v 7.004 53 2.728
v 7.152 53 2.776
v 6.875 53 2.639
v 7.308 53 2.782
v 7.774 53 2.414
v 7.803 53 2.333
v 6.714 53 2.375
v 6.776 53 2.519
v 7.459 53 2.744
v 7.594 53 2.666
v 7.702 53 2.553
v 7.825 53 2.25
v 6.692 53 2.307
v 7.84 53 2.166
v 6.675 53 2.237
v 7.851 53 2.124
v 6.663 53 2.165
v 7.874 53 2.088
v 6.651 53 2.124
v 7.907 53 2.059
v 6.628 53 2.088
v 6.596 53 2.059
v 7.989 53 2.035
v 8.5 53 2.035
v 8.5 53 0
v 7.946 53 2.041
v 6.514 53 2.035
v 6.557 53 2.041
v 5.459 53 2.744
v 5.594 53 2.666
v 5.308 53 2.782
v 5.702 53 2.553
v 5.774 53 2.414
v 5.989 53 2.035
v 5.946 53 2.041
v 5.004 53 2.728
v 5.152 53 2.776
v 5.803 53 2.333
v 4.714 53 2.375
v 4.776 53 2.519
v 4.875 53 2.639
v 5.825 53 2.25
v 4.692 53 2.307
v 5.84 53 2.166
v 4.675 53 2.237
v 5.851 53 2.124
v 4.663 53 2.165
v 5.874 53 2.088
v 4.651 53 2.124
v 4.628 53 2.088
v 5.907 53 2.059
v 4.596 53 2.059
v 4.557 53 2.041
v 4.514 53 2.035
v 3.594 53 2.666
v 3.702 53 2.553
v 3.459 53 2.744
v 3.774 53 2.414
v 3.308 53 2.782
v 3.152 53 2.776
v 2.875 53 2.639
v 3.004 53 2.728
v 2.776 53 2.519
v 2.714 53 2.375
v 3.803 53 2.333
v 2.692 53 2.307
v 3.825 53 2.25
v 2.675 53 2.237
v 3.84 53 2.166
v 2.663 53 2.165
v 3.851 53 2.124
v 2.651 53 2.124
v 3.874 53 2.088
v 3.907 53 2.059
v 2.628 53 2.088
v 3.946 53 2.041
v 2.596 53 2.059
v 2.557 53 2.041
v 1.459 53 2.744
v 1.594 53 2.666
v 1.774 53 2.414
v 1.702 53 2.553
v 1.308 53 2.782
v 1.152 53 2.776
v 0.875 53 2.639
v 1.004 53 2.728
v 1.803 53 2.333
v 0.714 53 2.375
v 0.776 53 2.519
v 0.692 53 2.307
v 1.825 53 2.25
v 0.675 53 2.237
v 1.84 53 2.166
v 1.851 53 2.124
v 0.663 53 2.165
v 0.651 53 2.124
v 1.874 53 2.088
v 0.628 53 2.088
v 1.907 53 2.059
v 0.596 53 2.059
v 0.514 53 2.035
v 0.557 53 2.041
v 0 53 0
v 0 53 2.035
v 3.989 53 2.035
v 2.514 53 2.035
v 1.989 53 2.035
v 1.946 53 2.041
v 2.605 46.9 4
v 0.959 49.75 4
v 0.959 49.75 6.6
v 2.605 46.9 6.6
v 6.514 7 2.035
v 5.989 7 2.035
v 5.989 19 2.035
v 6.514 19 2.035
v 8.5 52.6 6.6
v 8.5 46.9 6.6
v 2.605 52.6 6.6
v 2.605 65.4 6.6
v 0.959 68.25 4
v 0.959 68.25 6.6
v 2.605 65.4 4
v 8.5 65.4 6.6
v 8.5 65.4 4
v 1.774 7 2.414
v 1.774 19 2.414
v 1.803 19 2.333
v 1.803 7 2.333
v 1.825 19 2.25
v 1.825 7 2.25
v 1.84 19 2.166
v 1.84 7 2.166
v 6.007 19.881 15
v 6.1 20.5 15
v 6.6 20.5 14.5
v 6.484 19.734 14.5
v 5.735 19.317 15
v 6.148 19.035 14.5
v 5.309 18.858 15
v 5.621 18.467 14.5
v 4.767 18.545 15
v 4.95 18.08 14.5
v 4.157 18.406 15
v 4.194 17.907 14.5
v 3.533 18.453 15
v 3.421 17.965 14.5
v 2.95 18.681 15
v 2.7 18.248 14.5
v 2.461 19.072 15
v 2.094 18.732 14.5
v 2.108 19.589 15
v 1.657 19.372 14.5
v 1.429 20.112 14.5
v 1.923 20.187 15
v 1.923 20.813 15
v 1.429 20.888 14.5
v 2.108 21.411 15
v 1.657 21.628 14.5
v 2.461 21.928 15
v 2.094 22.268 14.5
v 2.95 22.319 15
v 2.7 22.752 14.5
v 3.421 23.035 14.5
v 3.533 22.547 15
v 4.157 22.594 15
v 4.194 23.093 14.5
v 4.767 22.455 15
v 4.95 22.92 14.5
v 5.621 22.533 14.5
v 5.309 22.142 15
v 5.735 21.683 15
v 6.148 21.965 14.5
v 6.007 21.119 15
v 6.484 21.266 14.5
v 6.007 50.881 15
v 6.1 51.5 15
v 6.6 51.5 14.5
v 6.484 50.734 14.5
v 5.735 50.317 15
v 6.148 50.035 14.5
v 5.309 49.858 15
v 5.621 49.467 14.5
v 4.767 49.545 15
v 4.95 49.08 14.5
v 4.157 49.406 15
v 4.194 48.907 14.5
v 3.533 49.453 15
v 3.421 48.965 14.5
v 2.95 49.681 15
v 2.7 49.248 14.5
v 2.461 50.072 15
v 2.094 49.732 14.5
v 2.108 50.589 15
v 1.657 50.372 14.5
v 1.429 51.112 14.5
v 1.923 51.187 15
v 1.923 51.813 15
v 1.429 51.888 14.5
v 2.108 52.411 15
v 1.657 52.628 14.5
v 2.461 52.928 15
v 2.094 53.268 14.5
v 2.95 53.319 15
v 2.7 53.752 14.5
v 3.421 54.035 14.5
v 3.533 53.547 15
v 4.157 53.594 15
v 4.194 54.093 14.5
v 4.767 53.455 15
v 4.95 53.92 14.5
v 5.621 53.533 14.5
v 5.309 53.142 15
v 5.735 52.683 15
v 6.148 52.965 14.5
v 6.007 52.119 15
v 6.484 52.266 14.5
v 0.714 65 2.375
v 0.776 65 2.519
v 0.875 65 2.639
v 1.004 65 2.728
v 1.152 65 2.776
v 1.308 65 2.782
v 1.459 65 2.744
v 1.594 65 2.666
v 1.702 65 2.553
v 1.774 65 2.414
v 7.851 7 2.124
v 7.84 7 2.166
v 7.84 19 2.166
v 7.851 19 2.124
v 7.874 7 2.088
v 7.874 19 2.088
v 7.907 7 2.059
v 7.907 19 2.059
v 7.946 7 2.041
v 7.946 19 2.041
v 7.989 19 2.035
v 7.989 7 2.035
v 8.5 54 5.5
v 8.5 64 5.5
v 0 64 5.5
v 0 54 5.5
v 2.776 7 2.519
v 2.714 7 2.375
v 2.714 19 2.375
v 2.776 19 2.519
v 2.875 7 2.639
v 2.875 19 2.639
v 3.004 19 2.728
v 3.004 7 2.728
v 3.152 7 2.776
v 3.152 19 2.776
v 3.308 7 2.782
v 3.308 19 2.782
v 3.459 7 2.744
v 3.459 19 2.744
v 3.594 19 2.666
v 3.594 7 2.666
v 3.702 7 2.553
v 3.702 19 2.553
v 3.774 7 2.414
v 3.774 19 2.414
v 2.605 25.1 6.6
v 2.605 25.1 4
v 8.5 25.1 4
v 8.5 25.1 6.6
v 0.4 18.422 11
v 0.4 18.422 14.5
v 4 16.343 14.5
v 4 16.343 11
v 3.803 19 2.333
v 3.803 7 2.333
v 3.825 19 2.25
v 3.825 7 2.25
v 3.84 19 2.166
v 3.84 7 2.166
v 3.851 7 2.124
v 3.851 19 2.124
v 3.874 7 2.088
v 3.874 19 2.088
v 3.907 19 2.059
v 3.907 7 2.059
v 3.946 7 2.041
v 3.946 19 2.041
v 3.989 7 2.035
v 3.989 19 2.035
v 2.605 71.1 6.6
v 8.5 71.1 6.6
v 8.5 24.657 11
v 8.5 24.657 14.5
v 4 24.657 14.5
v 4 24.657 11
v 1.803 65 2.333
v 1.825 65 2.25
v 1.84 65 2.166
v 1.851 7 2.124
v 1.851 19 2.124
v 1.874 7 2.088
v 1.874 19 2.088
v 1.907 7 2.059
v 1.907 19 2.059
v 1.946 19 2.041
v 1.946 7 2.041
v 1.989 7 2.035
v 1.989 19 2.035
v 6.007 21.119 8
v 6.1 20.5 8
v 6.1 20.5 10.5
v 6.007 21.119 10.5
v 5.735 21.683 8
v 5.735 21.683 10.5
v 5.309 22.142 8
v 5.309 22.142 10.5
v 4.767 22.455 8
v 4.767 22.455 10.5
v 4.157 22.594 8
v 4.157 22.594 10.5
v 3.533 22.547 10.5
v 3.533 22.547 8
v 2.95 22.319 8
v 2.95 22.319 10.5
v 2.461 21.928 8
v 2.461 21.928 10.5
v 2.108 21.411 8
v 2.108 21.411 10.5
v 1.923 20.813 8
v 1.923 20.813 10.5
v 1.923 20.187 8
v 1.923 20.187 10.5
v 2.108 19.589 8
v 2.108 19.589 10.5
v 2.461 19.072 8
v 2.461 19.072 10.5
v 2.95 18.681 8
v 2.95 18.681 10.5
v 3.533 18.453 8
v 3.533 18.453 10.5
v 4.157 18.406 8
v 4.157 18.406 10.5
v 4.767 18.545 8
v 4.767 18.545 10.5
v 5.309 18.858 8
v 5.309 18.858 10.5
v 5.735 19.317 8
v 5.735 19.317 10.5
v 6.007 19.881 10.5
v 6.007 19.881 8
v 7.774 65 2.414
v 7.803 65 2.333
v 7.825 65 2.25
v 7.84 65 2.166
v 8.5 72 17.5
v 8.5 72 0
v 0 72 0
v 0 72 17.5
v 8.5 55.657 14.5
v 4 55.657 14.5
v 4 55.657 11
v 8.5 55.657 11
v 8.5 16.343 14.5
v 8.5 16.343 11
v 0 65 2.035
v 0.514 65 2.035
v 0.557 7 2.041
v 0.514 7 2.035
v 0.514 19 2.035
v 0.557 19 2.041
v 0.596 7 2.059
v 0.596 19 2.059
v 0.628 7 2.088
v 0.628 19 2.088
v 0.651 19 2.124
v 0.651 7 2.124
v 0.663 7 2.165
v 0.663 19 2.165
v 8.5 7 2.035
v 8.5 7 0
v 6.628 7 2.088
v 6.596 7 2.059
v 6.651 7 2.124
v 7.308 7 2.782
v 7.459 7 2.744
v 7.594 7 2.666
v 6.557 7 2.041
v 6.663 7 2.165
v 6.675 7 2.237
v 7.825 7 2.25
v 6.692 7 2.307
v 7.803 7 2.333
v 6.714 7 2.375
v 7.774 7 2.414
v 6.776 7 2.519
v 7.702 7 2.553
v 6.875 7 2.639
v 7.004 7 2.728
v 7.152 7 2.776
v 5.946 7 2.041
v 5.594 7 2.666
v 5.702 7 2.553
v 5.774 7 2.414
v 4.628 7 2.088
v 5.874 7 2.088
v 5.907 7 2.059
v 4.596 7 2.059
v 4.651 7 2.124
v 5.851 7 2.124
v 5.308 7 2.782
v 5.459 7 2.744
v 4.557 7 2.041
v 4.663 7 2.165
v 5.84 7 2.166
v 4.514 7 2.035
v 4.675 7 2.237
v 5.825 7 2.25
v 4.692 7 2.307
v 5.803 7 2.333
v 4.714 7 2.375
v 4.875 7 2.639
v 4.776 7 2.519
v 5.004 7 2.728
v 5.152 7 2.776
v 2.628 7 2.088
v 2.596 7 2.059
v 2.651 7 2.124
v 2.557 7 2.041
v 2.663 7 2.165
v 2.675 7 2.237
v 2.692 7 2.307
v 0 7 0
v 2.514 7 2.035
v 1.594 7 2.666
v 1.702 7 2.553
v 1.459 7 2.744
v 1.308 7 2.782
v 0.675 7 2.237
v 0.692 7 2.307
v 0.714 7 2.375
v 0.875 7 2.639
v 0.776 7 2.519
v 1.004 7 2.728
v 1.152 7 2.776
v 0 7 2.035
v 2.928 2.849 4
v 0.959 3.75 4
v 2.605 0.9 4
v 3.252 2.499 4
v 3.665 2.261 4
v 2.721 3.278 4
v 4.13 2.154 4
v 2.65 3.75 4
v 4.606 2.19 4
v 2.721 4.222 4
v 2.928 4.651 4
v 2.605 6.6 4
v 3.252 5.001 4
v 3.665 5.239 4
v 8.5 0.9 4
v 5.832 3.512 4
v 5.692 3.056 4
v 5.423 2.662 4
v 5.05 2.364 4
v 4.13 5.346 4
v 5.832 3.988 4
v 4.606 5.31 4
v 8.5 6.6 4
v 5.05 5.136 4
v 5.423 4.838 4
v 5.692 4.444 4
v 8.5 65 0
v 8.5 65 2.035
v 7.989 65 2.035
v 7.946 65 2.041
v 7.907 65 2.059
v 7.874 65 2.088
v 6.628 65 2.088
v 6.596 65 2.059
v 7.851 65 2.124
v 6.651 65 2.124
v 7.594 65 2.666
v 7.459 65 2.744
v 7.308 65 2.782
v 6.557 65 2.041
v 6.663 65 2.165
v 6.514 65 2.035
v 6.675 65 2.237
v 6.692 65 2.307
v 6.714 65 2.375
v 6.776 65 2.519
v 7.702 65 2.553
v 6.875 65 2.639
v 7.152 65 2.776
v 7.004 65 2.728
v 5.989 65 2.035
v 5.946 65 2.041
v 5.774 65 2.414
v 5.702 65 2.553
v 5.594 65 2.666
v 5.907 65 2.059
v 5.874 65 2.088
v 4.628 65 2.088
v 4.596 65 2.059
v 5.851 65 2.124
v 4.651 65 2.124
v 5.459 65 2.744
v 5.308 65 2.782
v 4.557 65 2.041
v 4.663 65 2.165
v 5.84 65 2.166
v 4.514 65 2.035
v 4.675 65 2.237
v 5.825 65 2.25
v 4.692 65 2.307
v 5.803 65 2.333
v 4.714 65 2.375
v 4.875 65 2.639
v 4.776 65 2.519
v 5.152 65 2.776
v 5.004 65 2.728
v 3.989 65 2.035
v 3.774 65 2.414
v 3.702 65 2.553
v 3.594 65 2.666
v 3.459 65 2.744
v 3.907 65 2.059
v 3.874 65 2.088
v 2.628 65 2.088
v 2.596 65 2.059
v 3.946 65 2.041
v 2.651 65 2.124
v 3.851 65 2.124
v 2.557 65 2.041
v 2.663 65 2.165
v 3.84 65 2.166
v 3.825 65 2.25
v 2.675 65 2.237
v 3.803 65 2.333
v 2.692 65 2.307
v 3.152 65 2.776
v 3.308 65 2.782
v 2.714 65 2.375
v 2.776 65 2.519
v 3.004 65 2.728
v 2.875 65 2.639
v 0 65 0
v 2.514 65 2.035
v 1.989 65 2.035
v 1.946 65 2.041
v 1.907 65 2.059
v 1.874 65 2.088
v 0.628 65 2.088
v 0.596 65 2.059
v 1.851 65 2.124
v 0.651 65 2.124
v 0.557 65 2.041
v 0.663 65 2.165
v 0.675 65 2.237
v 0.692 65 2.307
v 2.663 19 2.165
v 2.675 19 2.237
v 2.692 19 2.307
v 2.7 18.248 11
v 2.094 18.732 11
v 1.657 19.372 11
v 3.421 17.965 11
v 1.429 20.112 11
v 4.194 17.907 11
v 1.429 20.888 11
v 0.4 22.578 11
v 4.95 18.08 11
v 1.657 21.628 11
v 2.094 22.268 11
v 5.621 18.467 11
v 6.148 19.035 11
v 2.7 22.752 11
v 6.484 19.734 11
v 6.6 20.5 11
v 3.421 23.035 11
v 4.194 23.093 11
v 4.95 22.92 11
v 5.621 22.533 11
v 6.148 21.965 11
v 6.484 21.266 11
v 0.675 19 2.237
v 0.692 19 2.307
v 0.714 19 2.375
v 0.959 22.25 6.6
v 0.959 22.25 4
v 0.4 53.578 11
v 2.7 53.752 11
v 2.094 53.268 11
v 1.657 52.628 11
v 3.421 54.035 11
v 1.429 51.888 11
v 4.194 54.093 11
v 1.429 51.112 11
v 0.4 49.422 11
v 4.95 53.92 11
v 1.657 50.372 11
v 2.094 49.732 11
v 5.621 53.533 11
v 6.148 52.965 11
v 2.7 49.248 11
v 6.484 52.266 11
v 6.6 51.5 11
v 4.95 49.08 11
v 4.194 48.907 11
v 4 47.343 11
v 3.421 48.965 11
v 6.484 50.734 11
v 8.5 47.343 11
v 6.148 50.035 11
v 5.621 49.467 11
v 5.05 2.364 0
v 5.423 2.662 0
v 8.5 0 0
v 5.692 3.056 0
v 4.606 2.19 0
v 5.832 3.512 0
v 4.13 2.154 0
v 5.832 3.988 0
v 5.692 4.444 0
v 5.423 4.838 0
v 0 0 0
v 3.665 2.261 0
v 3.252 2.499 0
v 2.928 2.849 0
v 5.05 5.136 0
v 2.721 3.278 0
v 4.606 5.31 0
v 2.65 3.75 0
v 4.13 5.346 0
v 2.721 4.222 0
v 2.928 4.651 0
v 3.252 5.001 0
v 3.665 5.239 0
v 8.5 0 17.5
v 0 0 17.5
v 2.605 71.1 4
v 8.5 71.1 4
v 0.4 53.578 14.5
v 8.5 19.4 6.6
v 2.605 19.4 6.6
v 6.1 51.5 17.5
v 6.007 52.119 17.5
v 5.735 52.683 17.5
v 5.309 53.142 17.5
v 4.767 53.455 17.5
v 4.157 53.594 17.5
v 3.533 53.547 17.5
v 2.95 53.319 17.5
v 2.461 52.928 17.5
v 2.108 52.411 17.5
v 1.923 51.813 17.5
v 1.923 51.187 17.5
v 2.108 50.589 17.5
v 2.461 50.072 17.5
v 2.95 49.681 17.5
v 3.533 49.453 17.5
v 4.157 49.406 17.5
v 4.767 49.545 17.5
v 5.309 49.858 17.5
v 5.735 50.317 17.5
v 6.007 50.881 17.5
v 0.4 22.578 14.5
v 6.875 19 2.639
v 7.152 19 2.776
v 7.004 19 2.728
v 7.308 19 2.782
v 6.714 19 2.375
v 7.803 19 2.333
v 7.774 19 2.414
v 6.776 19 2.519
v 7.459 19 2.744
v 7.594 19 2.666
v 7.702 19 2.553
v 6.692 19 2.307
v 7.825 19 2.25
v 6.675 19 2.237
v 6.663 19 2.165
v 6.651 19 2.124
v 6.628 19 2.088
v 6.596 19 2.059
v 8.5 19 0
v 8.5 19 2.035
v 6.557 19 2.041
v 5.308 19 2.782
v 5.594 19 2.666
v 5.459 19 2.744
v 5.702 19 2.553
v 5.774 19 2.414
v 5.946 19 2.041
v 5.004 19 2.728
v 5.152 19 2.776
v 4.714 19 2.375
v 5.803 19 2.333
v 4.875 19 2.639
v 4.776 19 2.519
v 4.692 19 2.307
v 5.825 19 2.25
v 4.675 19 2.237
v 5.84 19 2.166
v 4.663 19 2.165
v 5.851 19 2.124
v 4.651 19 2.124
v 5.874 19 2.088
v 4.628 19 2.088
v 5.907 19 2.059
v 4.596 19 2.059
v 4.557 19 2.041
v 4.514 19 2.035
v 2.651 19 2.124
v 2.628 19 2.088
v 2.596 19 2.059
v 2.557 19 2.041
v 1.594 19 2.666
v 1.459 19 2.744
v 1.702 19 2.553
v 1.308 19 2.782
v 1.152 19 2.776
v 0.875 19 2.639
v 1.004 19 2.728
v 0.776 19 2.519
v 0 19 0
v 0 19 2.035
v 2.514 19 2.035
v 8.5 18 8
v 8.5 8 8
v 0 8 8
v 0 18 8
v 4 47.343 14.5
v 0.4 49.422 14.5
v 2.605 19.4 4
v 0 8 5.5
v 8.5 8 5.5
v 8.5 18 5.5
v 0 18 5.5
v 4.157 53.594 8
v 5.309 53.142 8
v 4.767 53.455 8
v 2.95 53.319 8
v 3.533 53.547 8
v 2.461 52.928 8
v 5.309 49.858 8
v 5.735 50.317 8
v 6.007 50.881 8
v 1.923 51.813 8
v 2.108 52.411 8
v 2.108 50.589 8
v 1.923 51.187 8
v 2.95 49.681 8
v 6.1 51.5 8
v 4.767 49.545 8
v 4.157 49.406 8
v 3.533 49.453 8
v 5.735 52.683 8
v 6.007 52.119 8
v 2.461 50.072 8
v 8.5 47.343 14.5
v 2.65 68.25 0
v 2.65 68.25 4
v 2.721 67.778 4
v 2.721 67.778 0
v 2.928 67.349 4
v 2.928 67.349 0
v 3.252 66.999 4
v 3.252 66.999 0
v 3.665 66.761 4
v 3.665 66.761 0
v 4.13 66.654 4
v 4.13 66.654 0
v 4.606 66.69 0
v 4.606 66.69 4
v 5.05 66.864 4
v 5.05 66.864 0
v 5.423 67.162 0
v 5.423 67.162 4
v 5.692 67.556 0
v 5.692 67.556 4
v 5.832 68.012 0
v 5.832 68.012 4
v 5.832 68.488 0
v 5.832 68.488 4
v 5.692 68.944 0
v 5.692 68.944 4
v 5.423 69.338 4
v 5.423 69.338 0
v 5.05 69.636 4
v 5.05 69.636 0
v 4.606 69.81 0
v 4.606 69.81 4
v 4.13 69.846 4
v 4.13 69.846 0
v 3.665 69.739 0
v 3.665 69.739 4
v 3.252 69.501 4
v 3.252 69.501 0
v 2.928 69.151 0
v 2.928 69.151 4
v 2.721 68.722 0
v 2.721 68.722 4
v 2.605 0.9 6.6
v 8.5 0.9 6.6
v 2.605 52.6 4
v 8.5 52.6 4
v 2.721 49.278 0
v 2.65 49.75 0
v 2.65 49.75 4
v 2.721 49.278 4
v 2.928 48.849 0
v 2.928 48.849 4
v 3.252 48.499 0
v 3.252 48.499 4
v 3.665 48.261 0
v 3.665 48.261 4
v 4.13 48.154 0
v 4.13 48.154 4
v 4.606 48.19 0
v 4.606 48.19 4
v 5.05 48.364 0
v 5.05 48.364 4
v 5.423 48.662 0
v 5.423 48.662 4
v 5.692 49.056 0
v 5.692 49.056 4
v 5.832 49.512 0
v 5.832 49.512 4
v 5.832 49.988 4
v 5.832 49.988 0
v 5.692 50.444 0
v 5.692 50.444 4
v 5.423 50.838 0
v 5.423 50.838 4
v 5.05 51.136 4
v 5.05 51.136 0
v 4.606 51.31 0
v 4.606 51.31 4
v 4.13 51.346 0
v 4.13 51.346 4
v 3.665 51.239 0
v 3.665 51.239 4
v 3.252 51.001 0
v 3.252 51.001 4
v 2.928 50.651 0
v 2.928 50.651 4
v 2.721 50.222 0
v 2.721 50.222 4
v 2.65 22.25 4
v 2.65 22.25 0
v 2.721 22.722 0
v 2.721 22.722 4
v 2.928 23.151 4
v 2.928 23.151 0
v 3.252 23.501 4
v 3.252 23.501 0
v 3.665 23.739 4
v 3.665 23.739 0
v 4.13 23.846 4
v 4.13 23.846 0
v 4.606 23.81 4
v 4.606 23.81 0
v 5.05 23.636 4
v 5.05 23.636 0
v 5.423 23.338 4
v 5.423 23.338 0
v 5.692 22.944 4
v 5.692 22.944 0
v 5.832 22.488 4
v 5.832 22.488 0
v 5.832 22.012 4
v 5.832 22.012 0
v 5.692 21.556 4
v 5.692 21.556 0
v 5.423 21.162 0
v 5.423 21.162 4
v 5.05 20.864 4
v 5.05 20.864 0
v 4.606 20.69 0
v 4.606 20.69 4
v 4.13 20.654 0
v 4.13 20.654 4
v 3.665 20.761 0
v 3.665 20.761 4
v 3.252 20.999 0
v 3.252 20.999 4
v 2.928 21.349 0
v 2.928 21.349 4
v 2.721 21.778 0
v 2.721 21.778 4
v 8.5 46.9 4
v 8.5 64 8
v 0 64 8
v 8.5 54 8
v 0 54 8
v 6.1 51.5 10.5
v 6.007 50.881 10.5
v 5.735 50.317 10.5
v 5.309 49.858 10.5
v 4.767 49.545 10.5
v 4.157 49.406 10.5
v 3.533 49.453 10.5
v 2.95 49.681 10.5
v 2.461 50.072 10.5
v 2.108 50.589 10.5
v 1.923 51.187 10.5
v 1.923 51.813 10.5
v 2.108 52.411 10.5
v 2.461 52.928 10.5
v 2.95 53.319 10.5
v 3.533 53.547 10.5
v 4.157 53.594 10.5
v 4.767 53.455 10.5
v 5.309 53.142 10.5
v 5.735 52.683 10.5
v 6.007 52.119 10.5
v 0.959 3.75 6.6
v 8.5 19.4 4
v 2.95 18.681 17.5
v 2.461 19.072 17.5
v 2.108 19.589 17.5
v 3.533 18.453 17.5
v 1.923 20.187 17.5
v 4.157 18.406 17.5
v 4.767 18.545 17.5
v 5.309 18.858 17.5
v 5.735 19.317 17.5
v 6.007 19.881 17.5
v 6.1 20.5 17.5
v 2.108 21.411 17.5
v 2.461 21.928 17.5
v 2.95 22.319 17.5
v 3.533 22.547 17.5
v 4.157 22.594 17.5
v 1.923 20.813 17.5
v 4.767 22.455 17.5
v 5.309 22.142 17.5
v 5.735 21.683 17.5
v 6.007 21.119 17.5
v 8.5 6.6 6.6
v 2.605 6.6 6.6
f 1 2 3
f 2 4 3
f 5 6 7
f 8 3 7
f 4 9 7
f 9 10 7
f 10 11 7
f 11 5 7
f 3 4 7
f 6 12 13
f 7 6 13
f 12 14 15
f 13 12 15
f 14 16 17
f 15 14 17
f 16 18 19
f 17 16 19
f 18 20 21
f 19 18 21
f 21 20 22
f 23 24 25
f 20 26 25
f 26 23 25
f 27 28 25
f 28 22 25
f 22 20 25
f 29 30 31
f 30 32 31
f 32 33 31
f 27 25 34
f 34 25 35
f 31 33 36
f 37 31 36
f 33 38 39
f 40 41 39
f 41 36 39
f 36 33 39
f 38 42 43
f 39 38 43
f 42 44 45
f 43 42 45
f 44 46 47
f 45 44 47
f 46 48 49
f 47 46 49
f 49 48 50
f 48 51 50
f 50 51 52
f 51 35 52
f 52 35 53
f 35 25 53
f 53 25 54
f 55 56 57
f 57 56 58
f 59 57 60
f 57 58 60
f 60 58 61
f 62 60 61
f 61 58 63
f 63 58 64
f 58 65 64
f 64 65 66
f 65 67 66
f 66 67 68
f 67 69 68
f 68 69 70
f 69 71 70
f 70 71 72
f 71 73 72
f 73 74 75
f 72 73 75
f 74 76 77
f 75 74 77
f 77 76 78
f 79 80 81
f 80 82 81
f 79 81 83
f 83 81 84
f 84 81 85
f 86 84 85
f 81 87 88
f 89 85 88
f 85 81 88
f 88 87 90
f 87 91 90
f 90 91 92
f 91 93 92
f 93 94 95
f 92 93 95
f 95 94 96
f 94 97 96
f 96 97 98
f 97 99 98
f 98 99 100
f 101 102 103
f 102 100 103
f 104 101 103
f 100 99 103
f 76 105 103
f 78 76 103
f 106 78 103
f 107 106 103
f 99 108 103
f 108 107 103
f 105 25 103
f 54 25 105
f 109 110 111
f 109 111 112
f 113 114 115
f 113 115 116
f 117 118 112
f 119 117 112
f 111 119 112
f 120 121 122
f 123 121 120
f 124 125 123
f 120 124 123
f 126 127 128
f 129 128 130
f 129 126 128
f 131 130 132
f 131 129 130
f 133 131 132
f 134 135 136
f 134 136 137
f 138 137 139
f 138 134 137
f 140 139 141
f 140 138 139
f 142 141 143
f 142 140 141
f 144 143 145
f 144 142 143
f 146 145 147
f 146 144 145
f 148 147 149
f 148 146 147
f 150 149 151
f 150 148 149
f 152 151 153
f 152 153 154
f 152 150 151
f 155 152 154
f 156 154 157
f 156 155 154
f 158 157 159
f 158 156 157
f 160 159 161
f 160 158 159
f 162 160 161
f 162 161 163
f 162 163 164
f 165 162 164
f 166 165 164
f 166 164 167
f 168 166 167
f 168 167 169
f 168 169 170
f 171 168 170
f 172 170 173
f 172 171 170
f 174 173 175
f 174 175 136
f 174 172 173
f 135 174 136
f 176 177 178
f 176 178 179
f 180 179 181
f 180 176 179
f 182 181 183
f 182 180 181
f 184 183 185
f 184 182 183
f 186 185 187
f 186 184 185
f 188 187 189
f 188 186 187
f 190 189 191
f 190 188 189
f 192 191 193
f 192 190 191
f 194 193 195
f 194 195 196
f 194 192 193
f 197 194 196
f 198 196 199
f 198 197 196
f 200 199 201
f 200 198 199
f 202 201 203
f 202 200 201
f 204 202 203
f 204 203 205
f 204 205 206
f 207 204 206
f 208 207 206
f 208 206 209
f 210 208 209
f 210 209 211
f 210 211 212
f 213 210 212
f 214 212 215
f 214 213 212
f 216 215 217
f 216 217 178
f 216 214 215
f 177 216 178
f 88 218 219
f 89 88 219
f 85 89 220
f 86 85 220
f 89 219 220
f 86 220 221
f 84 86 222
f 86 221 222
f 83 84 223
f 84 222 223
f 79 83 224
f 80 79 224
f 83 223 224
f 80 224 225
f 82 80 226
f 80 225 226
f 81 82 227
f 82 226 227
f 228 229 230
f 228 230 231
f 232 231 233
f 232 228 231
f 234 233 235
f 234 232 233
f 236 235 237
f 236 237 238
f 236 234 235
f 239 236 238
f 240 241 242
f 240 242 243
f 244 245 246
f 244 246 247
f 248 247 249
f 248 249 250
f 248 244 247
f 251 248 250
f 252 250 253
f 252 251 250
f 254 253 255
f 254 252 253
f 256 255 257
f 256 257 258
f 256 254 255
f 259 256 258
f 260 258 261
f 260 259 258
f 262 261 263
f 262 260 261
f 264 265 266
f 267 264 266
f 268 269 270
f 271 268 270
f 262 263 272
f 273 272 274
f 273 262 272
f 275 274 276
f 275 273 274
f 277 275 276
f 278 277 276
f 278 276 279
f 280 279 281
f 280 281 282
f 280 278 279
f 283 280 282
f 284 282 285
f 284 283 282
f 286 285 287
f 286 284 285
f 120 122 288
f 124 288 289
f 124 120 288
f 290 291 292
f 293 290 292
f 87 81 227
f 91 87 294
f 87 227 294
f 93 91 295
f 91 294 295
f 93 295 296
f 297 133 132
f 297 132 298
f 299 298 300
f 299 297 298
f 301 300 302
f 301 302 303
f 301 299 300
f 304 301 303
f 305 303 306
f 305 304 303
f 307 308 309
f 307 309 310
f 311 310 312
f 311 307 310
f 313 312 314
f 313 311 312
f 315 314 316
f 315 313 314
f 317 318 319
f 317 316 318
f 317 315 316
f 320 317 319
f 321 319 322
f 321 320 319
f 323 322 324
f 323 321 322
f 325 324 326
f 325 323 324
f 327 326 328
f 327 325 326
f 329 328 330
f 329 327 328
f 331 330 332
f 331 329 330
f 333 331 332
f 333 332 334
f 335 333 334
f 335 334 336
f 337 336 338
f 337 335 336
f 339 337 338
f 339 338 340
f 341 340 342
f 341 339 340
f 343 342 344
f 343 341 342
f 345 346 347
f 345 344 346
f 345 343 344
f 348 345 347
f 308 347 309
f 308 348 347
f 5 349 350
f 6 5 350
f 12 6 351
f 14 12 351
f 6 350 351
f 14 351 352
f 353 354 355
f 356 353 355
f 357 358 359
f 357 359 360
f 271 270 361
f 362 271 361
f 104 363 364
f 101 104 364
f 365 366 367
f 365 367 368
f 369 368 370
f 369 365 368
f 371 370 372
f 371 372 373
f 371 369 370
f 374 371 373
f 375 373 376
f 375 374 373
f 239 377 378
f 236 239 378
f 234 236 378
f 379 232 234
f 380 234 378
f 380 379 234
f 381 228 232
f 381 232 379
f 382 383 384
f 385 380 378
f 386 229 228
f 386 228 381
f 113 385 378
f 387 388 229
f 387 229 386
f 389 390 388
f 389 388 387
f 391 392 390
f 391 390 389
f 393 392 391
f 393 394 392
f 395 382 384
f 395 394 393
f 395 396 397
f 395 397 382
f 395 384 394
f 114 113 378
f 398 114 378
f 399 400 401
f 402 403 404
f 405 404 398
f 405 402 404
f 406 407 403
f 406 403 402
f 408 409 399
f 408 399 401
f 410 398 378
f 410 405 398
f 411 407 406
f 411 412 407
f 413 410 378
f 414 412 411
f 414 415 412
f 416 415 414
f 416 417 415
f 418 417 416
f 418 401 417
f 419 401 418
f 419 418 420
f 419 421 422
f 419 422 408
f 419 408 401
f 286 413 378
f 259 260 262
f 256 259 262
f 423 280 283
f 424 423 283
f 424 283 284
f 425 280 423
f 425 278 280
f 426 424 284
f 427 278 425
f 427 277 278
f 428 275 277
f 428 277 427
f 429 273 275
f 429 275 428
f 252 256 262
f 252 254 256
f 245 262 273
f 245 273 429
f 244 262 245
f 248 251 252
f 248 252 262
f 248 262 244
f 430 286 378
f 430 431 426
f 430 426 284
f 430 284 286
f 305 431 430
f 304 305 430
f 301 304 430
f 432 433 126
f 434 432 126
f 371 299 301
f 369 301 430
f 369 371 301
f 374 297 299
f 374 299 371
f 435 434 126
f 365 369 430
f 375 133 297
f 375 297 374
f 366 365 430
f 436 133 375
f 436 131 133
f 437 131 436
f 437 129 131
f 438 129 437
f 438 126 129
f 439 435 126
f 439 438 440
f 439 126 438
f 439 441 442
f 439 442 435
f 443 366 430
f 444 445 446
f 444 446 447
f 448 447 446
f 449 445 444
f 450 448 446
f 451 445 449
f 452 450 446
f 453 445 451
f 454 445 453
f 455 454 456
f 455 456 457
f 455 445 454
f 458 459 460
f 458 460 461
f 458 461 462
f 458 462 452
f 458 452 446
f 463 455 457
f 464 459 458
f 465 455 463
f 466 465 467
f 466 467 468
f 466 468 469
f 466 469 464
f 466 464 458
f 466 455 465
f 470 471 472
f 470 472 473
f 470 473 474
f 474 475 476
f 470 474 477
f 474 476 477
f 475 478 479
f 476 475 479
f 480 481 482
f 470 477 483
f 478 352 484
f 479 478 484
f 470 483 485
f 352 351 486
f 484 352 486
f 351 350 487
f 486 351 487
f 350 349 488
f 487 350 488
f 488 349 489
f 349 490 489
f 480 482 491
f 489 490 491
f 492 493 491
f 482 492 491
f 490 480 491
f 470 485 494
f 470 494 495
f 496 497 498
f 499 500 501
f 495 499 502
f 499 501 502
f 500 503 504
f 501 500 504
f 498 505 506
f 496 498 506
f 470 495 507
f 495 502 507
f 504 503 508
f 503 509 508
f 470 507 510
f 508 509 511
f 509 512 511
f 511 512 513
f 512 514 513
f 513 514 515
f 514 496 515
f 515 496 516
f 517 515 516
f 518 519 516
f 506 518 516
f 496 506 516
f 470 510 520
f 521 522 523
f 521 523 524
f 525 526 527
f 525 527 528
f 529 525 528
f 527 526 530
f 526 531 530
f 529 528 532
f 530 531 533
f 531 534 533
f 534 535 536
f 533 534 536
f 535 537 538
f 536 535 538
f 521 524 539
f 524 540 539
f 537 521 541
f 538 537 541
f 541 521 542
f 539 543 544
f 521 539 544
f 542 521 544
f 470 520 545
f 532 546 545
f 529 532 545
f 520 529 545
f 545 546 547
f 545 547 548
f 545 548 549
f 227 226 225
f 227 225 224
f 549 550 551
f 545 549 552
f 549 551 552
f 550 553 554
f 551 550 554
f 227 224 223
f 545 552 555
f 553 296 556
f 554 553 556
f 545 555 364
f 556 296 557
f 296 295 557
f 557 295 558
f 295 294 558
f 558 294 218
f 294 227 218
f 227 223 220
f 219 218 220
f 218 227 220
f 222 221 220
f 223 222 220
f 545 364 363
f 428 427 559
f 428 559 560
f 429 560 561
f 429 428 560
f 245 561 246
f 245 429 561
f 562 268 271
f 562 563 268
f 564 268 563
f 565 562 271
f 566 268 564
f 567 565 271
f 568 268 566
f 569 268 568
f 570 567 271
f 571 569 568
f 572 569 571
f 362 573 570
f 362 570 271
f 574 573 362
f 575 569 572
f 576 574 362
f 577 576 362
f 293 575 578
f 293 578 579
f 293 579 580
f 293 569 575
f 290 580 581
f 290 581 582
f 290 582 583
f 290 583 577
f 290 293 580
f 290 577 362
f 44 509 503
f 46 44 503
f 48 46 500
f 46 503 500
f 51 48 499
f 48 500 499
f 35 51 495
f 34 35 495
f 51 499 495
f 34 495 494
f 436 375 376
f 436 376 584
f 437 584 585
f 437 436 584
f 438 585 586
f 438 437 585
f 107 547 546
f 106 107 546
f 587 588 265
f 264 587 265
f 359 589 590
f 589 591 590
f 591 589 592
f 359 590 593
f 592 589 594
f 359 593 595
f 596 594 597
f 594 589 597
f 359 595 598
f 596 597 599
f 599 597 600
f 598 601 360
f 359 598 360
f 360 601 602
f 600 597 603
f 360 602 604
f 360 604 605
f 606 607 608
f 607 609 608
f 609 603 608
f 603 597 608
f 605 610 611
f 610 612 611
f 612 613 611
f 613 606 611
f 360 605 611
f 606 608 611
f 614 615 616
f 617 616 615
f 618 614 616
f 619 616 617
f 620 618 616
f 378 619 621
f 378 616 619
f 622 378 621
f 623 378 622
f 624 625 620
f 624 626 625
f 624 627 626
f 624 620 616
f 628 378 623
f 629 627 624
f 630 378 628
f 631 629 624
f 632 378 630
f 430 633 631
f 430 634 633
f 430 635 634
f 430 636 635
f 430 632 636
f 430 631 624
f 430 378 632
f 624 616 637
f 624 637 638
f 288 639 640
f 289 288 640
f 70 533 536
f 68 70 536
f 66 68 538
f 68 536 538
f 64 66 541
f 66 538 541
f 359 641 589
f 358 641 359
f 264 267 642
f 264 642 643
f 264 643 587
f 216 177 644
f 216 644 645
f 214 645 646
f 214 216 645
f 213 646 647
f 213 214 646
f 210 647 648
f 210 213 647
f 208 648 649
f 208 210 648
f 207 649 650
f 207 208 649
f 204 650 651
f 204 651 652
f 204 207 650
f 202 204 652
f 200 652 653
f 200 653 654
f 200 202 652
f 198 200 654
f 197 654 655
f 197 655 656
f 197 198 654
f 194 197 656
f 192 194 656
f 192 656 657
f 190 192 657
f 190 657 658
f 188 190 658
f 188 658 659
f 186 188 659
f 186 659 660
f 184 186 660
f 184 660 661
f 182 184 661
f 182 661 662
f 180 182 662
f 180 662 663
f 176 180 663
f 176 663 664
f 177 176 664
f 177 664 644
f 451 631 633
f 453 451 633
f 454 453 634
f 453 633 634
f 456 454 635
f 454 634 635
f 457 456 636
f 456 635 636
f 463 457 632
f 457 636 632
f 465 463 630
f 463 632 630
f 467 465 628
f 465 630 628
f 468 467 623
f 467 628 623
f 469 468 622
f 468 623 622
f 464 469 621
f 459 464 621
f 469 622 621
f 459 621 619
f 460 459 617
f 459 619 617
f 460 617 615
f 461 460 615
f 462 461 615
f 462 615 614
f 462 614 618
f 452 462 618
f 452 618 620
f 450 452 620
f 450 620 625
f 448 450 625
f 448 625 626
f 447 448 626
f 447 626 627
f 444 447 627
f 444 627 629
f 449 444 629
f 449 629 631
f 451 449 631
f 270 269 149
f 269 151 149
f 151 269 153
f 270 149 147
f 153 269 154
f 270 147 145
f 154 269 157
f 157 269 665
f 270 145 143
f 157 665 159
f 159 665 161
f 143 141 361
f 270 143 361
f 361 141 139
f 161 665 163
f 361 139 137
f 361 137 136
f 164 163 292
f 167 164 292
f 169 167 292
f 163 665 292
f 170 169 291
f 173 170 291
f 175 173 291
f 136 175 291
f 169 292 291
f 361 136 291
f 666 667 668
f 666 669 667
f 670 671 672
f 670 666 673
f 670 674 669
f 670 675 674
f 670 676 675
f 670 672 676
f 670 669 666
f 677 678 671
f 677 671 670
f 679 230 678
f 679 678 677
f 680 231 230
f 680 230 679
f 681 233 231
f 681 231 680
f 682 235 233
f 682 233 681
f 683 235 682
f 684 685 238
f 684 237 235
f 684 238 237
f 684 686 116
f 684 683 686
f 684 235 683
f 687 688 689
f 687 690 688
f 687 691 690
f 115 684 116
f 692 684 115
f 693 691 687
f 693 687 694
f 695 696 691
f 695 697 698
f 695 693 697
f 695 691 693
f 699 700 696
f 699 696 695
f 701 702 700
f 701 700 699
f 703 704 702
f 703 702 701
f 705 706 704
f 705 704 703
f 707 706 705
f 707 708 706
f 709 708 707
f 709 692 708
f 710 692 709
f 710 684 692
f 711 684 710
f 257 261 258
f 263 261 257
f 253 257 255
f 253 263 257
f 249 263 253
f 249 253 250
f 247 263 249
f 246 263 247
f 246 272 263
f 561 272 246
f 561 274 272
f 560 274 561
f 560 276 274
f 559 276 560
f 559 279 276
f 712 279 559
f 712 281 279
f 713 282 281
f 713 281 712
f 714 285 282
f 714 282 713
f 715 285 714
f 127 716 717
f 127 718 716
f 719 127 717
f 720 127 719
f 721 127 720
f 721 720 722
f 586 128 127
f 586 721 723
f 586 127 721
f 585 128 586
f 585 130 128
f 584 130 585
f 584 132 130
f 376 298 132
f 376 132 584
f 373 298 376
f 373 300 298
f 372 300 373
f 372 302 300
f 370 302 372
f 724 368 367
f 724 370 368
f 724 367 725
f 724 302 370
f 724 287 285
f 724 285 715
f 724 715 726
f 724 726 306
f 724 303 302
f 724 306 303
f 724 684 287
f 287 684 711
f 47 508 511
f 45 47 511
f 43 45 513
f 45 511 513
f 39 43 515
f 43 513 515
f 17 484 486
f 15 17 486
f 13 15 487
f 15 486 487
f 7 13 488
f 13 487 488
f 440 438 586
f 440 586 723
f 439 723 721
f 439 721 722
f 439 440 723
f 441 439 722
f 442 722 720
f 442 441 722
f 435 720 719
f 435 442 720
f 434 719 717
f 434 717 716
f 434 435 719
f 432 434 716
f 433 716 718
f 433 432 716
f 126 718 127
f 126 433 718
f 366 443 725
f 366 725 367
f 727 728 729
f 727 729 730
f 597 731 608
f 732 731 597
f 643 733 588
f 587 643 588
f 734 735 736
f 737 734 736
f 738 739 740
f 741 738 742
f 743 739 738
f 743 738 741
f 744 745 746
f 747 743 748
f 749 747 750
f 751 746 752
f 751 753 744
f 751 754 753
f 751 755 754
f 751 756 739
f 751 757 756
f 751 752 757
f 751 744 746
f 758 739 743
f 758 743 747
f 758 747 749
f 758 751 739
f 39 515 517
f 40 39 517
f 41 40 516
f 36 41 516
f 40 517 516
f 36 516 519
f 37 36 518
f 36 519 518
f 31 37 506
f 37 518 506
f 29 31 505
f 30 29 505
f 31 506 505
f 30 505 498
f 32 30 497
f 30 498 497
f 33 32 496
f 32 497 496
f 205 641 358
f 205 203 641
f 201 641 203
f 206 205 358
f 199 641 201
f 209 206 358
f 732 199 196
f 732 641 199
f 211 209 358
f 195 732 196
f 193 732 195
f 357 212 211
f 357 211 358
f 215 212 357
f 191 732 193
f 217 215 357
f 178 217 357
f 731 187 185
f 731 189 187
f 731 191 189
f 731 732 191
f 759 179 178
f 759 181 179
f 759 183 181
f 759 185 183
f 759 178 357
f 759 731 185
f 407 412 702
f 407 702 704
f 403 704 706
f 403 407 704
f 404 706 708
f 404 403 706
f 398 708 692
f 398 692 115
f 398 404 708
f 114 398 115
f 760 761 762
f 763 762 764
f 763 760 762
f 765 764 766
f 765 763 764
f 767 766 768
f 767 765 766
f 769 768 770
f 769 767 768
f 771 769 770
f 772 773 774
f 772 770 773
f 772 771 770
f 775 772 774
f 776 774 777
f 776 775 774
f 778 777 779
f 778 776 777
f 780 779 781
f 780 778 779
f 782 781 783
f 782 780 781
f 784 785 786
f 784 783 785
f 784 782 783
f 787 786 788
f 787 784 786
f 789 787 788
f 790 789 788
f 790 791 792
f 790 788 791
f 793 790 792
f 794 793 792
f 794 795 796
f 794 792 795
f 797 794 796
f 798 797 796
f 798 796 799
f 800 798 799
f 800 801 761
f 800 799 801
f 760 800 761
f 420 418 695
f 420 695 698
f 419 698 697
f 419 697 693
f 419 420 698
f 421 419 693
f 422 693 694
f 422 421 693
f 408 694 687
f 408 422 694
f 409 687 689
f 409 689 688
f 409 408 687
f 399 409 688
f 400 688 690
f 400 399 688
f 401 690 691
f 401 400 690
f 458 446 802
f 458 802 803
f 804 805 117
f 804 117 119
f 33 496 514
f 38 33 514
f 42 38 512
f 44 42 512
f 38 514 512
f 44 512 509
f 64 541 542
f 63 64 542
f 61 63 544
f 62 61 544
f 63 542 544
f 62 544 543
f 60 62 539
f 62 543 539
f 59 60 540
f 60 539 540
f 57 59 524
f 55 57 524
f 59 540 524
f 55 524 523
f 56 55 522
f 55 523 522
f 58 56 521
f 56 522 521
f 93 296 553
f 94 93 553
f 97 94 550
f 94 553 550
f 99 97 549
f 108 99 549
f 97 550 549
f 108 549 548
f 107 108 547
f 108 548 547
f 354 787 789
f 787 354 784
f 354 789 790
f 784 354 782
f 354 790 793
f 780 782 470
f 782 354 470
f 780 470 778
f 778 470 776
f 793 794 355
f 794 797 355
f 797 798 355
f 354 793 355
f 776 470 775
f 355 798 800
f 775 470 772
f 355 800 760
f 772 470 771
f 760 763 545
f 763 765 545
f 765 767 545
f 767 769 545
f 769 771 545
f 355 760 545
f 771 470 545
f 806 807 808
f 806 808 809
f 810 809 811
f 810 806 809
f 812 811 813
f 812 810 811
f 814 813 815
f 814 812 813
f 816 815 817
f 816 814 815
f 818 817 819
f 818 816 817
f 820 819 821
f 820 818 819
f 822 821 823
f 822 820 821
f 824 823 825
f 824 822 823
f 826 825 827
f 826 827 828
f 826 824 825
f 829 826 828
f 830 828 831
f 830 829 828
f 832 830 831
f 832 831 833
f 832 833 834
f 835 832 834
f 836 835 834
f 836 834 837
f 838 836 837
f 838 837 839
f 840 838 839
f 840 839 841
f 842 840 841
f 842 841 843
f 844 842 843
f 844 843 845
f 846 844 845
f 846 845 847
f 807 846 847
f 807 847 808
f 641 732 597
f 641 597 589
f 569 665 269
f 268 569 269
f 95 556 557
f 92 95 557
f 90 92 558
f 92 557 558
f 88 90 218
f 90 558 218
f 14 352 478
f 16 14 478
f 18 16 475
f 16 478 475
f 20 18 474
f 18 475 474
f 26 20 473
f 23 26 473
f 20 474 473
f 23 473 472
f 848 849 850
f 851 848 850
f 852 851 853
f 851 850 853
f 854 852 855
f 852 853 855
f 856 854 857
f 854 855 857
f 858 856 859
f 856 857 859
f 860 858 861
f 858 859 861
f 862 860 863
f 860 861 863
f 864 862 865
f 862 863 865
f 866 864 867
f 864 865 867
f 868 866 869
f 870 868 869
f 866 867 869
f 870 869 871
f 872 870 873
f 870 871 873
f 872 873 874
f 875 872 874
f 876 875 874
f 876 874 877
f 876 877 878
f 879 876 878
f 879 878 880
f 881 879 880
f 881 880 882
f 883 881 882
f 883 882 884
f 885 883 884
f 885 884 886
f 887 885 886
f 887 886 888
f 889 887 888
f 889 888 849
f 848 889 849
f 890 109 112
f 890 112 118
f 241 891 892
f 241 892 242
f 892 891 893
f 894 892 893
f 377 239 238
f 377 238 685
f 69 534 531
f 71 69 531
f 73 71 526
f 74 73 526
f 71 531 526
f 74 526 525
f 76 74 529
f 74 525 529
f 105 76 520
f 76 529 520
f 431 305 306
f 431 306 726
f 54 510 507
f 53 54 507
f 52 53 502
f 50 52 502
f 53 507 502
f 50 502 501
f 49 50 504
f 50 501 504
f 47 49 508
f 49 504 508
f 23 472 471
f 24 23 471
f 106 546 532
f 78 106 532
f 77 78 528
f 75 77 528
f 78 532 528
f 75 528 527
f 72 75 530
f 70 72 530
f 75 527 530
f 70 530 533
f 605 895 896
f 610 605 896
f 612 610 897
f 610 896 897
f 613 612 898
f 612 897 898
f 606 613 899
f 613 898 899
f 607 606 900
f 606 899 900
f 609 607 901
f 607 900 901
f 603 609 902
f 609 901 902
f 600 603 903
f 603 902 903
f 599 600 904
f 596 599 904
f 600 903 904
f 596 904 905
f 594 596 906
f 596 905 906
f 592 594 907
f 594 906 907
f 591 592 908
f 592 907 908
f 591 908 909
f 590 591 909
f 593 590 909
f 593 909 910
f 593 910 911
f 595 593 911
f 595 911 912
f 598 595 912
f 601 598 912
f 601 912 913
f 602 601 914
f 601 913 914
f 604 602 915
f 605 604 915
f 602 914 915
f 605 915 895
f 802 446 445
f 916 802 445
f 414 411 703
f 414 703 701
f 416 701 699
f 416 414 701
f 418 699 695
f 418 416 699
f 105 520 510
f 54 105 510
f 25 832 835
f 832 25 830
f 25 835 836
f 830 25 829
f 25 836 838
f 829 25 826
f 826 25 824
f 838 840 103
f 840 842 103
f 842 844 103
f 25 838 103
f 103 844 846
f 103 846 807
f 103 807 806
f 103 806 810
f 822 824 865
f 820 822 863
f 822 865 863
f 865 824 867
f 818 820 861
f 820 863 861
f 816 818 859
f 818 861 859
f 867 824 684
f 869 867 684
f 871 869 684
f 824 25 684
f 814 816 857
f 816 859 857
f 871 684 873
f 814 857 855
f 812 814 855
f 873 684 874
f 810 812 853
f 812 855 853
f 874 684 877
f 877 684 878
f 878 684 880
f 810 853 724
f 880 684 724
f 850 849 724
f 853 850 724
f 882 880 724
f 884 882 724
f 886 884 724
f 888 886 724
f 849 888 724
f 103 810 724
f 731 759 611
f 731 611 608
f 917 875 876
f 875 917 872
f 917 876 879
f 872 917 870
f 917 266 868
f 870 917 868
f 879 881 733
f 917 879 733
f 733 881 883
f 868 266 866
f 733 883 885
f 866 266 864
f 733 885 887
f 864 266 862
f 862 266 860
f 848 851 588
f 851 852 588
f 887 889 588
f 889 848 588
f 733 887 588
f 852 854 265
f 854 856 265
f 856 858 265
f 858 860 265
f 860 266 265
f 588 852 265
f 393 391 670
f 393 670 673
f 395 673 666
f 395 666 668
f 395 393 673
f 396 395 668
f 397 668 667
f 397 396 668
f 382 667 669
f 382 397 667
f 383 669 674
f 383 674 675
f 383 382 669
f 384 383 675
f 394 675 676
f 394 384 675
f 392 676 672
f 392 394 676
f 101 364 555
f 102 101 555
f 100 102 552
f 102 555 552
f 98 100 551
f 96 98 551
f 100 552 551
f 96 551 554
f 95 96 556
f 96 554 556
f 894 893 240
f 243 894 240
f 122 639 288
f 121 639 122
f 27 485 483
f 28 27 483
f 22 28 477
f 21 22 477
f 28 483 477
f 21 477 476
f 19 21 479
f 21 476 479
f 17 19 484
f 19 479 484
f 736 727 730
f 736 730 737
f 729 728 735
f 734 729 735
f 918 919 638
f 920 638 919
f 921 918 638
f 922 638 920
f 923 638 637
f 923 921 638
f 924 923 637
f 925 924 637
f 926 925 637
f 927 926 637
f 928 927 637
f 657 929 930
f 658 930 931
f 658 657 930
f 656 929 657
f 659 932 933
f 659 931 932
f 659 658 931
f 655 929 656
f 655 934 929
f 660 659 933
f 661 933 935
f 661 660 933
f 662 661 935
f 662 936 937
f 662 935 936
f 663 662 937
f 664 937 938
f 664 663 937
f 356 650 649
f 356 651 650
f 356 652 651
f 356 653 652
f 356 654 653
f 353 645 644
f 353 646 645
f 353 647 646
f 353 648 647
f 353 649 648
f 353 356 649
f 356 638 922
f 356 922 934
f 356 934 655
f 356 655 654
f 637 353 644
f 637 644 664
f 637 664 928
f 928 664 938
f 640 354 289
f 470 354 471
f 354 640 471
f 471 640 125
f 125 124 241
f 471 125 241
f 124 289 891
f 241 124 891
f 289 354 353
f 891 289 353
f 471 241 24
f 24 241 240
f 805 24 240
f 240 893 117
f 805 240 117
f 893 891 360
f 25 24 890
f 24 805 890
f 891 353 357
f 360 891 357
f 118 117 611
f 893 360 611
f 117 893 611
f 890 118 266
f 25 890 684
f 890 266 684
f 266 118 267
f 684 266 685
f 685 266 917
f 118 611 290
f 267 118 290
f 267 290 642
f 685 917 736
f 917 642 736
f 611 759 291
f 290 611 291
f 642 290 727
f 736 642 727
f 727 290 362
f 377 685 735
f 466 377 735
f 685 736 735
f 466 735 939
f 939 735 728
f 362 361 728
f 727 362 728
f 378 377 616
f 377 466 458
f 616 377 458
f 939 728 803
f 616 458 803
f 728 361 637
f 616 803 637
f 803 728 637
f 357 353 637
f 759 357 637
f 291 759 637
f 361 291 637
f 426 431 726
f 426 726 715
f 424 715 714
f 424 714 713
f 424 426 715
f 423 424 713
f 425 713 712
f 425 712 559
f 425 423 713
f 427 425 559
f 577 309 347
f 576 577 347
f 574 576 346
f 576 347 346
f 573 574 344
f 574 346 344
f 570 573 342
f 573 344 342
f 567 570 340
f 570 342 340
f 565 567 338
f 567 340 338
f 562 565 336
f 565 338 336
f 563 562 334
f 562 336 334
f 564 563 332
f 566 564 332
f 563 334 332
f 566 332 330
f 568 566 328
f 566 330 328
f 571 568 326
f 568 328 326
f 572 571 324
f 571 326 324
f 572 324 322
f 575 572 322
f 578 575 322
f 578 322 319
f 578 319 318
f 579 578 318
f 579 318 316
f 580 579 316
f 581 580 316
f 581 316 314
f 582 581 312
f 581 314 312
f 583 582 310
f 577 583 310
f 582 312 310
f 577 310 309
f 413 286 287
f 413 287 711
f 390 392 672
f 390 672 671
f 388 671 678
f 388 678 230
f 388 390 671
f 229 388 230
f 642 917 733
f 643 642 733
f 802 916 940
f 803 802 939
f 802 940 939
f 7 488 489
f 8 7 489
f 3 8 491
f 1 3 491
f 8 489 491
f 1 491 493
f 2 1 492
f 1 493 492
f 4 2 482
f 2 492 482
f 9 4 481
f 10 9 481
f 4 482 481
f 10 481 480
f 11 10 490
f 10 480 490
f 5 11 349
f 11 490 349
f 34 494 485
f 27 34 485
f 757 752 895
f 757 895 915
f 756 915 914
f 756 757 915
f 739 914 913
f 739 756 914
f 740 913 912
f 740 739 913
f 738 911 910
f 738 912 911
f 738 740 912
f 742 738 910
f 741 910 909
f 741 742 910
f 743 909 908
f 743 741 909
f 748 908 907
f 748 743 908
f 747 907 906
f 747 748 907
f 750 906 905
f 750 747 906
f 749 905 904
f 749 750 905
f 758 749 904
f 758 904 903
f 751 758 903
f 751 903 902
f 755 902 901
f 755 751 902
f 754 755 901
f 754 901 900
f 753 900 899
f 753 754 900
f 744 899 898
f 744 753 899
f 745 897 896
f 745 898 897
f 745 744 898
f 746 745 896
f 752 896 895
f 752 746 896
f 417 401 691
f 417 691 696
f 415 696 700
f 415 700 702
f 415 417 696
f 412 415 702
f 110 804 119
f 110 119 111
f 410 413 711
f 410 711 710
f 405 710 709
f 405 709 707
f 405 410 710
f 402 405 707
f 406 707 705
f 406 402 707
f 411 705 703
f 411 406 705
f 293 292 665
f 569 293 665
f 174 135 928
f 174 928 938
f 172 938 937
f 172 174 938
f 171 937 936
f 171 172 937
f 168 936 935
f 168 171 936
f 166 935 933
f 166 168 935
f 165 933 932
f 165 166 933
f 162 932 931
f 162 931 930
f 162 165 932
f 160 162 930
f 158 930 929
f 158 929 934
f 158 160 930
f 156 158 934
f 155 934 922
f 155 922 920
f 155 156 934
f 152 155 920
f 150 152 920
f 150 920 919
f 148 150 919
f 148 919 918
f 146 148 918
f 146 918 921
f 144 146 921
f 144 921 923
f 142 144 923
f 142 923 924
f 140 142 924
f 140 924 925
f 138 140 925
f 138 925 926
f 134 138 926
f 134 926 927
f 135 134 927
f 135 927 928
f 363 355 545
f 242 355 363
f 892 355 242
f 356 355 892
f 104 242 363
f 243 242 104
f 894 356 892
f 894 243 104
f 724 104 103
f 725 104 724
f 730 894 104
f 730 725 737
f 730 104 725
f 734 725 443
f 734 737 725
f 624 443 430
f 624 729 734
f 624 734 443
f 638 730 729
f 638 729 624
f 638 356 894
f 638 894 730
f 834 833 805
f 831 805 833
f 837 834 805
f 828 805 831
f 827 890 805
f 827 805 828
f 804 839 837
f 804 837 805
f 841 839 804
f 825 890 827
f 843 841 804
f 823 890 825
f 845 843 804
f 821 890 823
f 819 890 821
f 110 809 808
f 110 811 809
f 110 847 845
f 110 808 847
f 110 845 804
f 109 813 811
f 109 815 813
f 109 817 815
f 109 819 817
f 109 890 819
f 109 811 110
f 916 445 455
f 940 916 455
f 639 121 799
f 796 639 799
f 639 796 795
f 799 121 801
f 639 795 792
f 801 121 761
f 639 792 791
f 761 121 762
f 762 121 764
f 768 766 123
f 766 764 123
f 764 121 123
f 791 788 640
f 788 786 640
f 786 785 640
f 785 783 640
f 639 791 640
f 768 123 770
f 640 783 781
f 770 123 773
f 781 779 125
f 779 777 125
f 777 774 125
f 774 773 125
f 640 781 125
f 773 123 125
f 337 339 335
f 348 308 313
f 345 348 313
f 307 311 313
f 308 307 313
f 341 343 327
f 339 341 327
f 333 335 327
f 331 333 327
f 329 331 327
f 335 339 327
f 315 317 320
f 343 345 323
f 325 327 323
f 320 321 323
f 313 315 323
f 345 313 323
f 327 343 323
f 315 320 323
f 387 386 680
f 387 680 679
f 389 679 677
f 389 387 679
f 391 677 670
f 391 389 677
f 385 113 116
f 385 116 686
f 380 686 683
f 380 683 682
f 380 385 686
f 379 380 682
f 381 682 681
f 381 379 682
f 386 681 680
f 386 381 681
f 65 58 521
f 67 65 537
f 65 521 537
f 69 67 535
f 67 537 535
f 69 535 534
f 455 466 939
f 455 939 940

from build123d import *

# Parameters (mm, degrees)
ESQUISSE1_W             = 8.5
ESQUISSE1_H             = 72
ESQUISSE1_R             = 2.1
BOSS_EXTRU_1_DEPTH      = 17.5
ENL_V_START             = -3
ENL_V_MAT_EXTRU_4_DEPTH = 3.5
ESQUISSE7_R             = 2.1
BOSS_EXTRU_3_DEPTH      = 8
ESQUISSE3_W             = 8.5
ESQUISSE3_H             = 4
ENL_V_MAT_EXTRU_3_DEPTH = 19
BOSS_EXTRU_2_START      = -7
BOSS_EXTRU_2_DEPTH      = 12
ESQUISSE8_W             = 8.5
ESQUISSE8_H             = 7
BOSS_EXTRU_4_DEPTH      = 4
ESQUISSE9_R             = 1.6
ENL_V_MAT_EXTRU_5_DEPTH = 5
ENL_V_START_2           = -4
ESQUISSE10_R            = 1.6
ENL_V_MAT_EXTRU_6_DEPTH = 2.6
ESQUISSE11_R            = 1.6
ENL_V_MAT_EXTRU_7_DEPTH = 1.6
ESQUISSE14_W            = 2.5
ESQUISSE14_H            = 10
ENL_V_MAT_EXTRU_9_DEPTH = 17.6
CHANFREIN1_SIZE         = 0.5


with BuildPart() as part:
    # Esquisse1 → Boss.-Extru.1 (new body)
    with BuildSketch(Plane.XY):
        with Locations((4.25, 36)):
            Rectangle(ESQUISSE1_W, ESQUISSE1_H)
        with Locations((4, 20.5)):
            Circle(ESQUISSE1_R, mode=Mode.SUBTRACT)
        with Locations((4, 51.5)):
            Circle(ESQUISSE1_R, mode=Mode.SUBTRACT)
    extrude(amount=BOSS_EXTRU_1_DEPTH)

    # Esquisse6 → Enlèv. mat.-Extru.4 (cut)
    with BuildSketch(Plane.XY.offset(17.5).offset(ENL_V_START)):
        Polygon((7.6, 22.578460969), (4, 24.656921938), (0.4, 22.578460969), (0.4, 18.421539031), (4, 16.343078062), (7.6, 18.421539031), align=None)
        Polygon((8.5, 24.656921938), (4, 24.656921938), (7.6, 22.578460969), (7.6, 18.421539031), (4, 16.343078062), (8.5, 16.343078062), align=None)
    enl_v_mat_extru_4 = extrude(amount=-ENL_V_MAT_EXTRU_4_DEPTH, mode=Mode.SUBTRACT)

    # Esquisse7 → Boss.-Extru.3 (add)
    with BuildSketch(Plane(origin=(0, 0, 0), x_dir=(-1, 0, 0), z_dir=(0, 0, -1))):
        with Locations((-4, 20.5)):
            Circle(ESQUISSE7_R)
    boss_extru_3 = extrude(amount=-BOSS_EXTRU_3_DEPTH)

    # Esquisse3 → Enlèv. mat.-Extru.3 (cut)
    with BuildSketch(Plane(origin=(0, 0, 0), x_dir=(-1, 0, 0), z_dir=(0, -1, 0))):
        with Locations((-4.25, -2)):
            Rectangle(ESQUISSE3_W, ESQUISSE3_H)
    enl_v_mat_extru_3 = extrude(amount=-ENL_V_MAT_EXTRU_3_DEPTH, mode=Mode.SUBTRACT)

    # Esquisse5 → Boss.-Extru.2 (add)
    with BuildSketch(Plane.XZ.offset(BOSS_EXTRU_2_START)):
        with BuildLine():
            ThreePointArc((4.662966643, 2.165487935), (4.682946936, 2.27184931), (4.714353535, 2.375413685))
            ThreePointArc((4.714353535, 2.375413685), (5.229781903, 2.78475984), (5.773646598, 2.414028307))
            ThreePointArc((5.773646598, 2.414028307), (5.814751932, 2.291920009), (5.839789089, 2.165534781))
            ThreePointArc((5.839789089, 2.165534781), (5.889607538, 2.072347427), (5.988503907, 2.035128225))
            Line((5.988503907, 2.035128225), (6.514258005, 2.035128225))
            ThreePointArc((6.514258005, 2.035128225), (6.613136609, 2.072331852), (6.662966643, 2.165487935))
            ThreePointArc((6.662966643, 2.165487935), (6.682946936, 2.27184931), (6.714353535, 2.375413685))
            ThreePointArc((6.714353535, 2.375413685), (7.229781903, 2.78475984), (7.773646598, 2.414028307))
            ThreePointArc((7.773646598, 2.414028307), (7.814751932, 2.291920009), (7.839789089, 2.165534781))
            ThreePointArc((7.839789089, 2.165534781), (7.889607538, 2.072347427), (7.988503907, 2.035128225))
            Line((7.988503907, 2.035128225), (8.5, 2.035128225))
            Line((8.5, 2.035128225), (8.5, 4))
            Line((8.5, 4), (0, 4))
            Line((0, 4), (0, 2.035128225))
            Line((0, 2.035128225), (0.514258005, 2.035128225))
            ThreePointArc((0.514258005, 2.035128225), (0.61313661, 2.072331853), (0.662966644, 2.165487937))
            ThreePointArc((0.662966644, 2.165487937), (0.682946936, 2.271849312), (0.714353535, 2.375413685))
            ThreePointArc((0.714353535, 2.375413685), (1.229781903, 2.78475984), (1.773646598, 2.414028307))
            ThreePointArc((1.773646598, 2.414028307), (1.814751932, 2.291920009), (1.839789089, 2.165534781))
            ThreePointArc((1.839789089, 2.165534781), (1.889607538, 2.072347427), (1.988503907, 2.035128225))
            Line((1.988503907, 2.035128225), (2.514258006, 2.035128225))
            ThreePointArc((2.514258006, 2.035128225), (2.613136611, 2.072331854), (2.662966644, 2.16548794))
            ThreePointArc((2.662966644, 2.16548794), (2.682946936, 2.271849313), (2.714353535, 2.375413685))
            ThreePointArc((2.714353535, 2.375413685), (3.229781903, 2.78475984), (3.773646598, 2.414028307))
            ThreePointArc((3.773646598, 2.414028307), (3.814751932, 2.291920009), (3.839789089, 2.165534781))
            ThreePointArc((3.839789089, 2.165534781), (3.889607538, 2.072347427), (3.988503907, 2.035128225))
            Line((3.988503907, 2.035128225), (4.514258005, 2.035128225))
            ThreePointArc((4.514258005, 2.035128225), (4.613136609, 2.072331852), (4.662966643, 2.165487935))
        make_face()
    boss_extru_2 = extrude(amount=-BOSS_EXTRU_2_DEPTH)

    # Esquisse8 → Boss.-Extru.4 (add)
    with BuildSketch(Plane(origin=(0, 0, 4), x_dir=(-1, 0, 0), z_dir=(0, 0, -1))):
        with Locations((-4.25, 3.5)):
            Rectangle(ESQUISSE8_W, ESQUISSE8_H)
    boss_extru_4 = extrude(amount=BOSS_EXTRU_4_DEPTH)

    # Esquisse9 → Enlèv. mat.-Extru.5 (cut)
    with BuildSketch(Plane(origin=(0, 0, 0), x_dir=(-1, 0, 0), z_dir=(0, 0, -1))):
        with Locations((-4.25, 3.75)):
            Circle(ESQUISSE9_R)
        with Locations((-4.25, 22.25)):
            Circle(ESQUISSE9_R)
    enl_v_mat_extru_5 = extrude(amount=-ENL_V_MAT_EXTRU_5_DEPTH, mode=Mode.SUBTRACT)

    # Esquisse10 → Enlèv. mat.-Extru.6 (cut)
    # profile 1 of 4: a face of its own
    with BuildSketch(Plane(origin=(0, 0, 0), x_dir=(-1, 0, 0), z_dir=(0, 0, -1)).offset(ENL_V_START_2)):
        Polygon((-2.604551733, 25.1), (-5.895448267, 25.1), (-7.540896534, 22.25), (-5.895448267, 19.4), (-2.604551733, 19.4), (-0.959103466, 22.25), align=None)
        with Locations((-4.25, 22.25)):
            Circle(ESQUISSE10_R, mode=Mode.SUBTRACT)
    # profile 2 of 4: a face of its own
    with BuildSketch(Plane(origin=(0, 0, 0), x_dir=(-1, 0, 0), z_dir=(0, 0, -1)).offset(ENL_V_START_2)):
        Polygon((-2.604551733, 6.6), (-5.895448267, 6.6), (-7.540896534, 3.75), (-5.895448267, 0.9), (-2.604551733, 0.9), (-0.959103466, 3.75), align=None)
    # profile 3 of 4: a face of its own
    with BuildSketch(Plane(origin=(0, 0, 0), x_dir=(-1, 0, 0), z_dir=(0, 0, -1)).offset(ENL_V_START_2)):
        Polygon((-8.5, 6.6), (-5.895448267, 6.6), (-7.540896534, 3.75), (-5.895448267, 0.9), (-8.5, 0.9), align=None)
    # profile 4 of 4: a face of its own
    with BuildSketch(Plane(origin=(0, 0, 0), x_dir=(-1, 0, 0), z_dir=(0, 0, -1)).offset(ENL_V_START_2)):
        Polygon((-7.540896534, 22.25), (-5.895448267, 25.1), (-8.5, 25.1), (-8.5, 19.4), (-5.895448267, 19.4), align=None)
    enl_v_mat_extru_6 = extrude(amount=-ENL_V_MAT_EXTRU_6_DEPTH, mode=Mode.SUBTRACT)

    # Esquisse11 → Enlèv. mat.-Extru.7 (cut)
    with BuildSketch(Plane(origin=(0, 0, 5), x_dir=(-1, 0, 0), z_dir=(0, 0, -1))):
        with Locations((-4.25, 22.25)):
            Circle(ESQUISSE11_R)
    enl_v_mat_extru_7 = extrude(amount=-ENL_V_MAT_EXTRU_7_DEPTH, mode=Mode.SUBTRACT)

    # Esquisse14 → Enlèv. mat.-Extru.9 (cut)
    with BuildSketch(Plane(origin=(8.5, 0, 0), x_dir=(0, 0, -1), z_dir=(1, 0, 0))):
        with Locations((-6.75, 13)):
            Rectangle(ESQUISSE14_W, ESQUISSE14_H)
    enl_v_mat_extru_9 = extrude(amount=-ENL_V_MAT_EXTRU_9_DEPTH, mode=Mode.SUBTRACT)

    # Symétrie14: Enlèv. mat.-Extru.4, Boss.-Extru.3, Enlèv. mat.-Extru.3, Boss.-Extru.2, Boss.-Extru.4, Enlèv. mat.-Extru.5, Enlèv. mat.-Extru.6, Enlèv. mat.-Extru.7, Enlèv. mat.-Extru.9 across plane
    add(enl_v_mat_extru_4.mirror(Plane(origin=(0, 36, 0), x_dir=(0, 0, 1), z_dir=(0, -1, 0))), mode=Mode.SUBTRACT)
    add(boss_extru_3.mirror(Plane(origin=(0, 36, 0), x_dir=(0, 0, 1), z_dir=(0, -1, 0))))
    add(enl_v_mat_extru_3.mirror(Plane(origin=(0, 36, 0), x_dir=(0, 0, 1), z_dir=(0, -1, 0))), mode=Mode.SUBTRACT)
    add(boss_extru_2.mirror(Plane(origin=(0, 36, 0), x_dir=(0, 0, 1), z_dir=(0, -1, 0))))
    add(boss_extru_4.mirror(Plane(origin=(0, 36, 0), x_dir=(0, 0, 1), z_dir=(0, -1, 0))))
    add(enl_v_mat_extru_5.mirror(Plane(origin=(0, 36, 0), x_dir=(0, 0, 1), z_dir=(0, -1, 0))), mode=Mode.SUBTRACT)
    add(enl_v_mat_extru_6.mirror(Plane(origin=(0, 36, 0), x_dir=(0, 0, 1), z_dir=(0, -1, 0))), mode=Mode.SUBTRACT)
    add(enl_v_mat_extru_7.mirror(Plane(origin=(0, 36, 0), x_dir=(0, 0, 1), z_dir=(0, -1, 0))), mode=Mode.SUBTRACT)
    add(enl_v_mat_extru_9.mirror(Plane(origin=(0, 36, 0), x_dir=(0, 0, 1), z_dir=(0, -1, 0))), mode=Mode.SUBTRACT)

    # Chanfrein1
    chanfrein1_edges = [part.edges().sort_by_distance(p)[0] for p in [
        (1.9, 51.5, 14.5),
        (1.9, 51.5, 11),
        (1.9, 20.5, 11),
        (1.9, 20.5, 14.5),
    ]]
    chamfer(chanfrein1_edges, length=CHANFREIN1_SIZE)


solid = part.part
